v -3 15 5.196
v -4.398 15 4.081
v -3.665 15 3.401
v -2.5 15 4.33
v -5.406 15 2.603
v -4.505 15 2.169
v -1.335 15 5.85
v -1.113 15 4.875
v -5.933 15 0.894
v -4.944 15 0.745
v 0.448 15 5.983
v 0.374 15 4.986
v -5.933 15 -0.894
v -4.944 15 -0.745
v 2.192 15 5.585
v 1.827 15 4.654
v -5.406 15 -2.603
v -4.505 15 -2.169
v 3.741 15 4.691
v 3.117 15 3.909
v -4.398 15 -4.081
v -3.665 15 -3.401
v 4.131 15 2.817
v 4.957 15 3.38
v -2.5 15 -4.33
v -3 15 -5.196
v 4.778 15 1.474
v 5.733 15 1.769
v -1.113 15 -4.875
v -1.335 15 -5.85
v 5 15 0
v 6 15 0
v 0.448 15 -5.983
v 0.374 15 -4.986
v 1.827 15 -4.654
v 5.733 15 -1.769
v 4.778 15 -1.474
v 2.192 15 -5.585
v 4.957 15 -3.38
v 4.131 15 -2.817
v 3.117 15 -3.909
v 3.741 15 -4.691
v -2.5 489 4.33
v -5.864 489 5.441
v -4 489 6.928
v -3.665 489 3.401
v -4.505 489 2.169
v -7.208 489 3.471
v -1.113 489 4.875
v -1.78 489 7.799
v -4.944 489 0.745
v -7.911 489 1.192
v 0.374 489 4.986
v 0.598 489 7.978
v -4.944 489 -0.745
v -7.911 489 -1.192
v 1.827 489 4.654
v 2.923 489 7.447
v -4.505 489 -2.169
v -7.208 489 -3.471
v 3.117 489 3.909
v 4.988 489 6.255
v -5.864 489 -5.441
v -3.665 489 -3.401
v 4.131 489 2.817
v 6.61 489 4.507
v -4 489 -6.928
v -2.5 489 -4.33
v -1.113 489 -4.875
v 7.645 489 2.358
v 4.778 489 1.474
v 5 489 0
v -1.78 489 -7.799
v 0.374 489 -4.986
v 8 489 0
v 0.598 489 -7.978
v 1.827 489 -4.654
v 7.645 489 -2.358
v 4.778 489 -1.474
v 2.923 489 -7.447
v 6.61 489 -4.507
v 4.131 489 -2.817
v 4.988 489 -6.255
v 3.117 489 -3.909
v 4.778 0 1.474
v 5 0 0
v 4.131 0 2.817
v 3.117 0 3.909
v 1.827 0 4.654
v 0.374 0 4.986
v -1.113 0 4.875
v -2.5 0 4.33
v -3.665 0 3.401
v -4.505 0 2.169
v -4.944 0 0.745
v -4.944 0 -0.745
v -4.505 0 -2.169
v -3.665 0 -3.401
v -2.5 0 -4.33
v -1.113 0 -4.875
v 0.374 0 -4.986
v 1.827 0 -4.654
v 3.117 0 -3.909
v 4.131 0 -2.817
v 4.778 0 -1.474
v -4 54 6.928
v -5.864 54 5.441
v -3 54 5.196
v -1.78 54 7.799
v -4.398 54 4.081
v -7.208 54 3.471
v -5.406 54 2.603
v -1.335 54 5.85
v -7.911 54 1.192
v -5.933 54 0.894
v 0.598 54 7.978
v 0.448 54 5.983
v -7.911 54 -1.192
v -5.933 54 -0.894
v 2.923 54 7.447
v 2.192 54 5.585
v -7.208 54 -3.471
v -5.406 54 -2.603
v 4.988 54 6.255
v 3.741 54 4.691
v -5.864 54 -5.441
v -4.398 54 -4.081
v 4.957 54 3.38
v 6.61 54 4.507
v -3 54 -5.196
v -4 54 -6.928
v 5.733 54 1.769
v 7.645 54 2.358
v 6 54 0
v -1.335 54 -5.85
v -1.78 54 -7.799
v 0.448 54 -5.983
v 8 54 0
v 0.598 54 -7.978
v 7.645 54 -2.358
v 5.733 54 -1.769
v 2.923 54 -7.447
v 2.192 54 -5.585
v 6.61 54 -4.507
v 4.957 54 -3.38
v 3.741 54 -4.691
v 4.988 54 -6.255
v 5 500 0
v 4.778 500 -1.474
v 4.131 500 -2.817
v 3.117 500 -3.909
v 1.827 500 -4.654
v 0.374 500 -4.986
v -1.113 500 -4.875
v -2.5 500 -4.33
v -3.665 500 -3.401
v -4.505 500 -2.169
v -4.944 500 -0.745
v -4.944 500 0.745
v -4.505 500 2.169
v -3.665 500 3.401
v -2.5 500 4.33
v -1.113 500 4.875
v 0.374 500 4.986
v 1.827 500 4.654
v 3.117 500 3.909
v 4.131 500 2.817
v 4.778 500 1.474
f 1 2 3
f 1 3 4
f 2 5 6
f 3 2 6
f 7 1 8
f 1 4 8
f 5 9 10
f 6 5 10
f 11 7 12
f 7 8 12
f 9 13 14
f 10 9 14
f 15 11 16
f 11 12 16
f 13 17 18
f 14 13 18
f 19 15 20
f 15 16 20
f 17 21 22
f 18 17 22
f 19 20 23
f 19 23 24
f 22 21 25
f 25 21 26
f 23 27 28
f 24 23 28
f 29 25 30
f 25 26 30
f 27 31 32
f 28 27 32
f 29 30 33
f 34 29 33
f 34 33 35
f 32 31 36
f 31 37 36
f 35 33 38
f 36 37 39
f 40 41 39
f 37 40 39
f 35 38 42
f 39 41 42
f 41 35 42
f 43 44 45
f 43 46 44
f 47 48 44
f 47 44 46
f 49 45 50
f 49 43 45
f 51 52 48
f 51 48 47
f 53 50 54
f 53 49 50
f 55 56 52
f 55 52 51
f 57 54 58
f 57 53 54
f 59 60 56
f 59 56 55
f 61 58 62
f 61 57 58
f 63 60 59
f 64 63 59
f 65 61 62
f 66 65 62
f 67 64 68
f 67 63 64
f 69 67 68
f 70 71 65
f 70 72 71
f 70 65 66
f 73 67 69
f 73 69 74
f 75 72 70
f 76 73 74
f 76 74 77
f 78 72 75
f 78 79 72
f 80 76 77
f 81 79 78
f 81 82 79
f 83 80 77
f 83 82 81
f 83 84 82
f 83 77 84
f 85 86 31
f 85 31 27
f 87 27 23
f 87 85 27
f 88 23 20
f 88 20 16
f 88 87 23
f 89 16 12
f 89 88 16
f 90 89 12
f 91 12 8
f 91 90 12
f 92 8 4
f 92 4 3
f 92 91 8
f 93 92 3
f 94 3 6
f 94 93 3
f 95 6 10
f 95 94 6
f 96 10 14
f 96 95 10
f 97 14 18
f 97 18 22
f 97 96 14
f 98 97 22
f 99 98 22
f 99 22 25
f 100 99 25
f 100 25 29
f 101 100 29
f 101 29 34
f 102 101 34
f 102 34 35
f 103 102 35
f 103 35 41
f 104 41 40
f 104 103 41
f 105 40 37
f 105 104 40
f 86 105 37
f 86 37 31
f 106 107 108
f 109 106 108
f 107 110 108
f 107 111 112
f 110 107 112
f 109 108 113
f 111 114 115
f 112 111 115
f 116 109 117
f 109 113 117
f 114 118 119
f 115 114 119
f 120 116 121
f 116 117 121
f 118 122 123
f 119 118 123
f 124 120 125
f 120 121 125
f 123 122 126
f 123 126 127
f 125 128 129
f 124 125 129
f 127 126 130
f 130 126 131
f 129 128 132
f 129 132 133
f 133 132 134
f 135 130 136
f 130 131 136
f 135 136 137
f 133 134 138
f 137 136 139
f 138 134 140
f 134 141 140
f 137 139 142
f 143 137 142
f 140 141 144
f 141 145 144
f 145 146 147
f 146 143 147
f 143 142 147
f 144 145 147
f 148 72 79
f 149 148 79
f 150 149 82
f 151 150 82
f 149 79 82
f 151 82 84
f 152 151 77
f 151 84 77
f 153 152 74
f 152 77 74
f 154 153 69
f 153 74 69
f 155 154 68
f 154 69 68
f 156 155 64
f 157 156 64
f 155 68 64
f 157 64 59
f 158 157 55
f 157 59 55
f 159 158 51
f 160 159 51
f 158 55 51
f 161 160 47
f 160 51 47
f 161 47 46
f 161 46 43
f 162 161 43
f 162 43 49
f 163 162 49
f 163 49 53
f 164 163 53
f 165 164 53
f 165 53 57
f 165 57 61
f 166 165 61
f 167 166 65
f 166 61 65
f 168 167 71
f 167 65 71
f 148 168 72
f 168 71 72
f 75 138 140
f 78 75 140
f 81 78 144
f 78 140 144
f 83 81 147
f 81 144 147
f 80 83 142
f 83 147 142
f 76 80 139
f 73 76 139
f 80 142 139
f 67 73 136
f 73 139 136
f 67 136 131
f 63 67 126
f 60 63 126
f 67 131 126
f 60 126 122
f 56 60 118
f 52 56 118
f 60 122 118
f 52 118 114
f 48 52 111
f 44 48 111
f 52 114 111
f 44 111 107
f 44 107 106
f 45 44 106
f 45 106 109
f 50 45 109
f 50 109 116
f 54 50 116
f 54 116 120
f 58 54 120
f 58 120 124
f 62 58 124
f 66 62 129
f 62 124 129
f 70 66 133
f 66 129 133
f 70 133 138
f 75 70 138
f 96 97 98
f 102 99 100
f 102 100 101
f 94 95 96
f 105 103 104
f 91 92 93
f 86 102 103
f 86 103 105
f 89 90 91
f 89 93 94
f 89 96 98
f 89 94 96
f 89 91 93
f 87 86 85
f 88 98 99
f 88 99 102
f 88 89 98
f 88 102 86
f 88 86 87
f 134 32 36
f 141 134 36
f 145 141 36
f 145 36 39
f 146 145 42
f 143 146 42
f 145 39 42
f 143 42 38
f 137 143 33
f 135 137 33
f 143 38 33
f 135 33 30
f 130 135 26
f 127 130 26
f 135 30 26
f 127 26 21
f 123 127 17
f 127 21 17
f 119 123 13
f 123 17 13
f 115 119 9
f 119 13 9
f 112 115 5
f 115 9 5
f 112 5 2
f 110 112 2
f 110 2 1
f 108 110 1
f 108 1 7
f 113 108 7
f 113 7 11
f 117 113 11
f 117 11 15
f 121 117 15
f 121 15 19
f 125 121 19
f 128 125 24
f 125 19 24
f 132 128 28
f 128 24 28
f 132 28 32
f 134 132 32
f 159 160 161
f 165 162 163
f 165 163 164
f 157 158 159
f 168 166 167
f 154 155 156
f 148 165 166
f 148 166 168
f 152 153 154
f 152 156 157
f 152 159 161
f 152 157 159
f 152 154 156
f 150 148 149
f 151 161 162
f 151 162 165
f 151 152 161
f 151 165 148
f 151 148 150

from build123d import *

# Parameters (mm, degrees)
SKETCH_R     = 5
PAD_DEPTH    = 15
SKETCH001_R  = 6
PAD001_DEPTH = 39
SKETCH002_R  = 8
PAD002_DEPTH = 435
SKETCH003_R  = 5
PAD003_DEPTH = 11


with BuildPart() as part:
    # Sketch → Pad (new body)
    with BuildSketch(Plane.XZ):
        Circle(SKETCH_R)
    extrude(amount=-PAD_DEPTH)

    # Sketch001 (on Face3 of Pad) → Pad001 (join)
    with BuildSketch(Plane(origin=(0, 15, 0), x_dir=(1, 0, 0), z_dir=(0, 1, 0))):
        Circle(SKETCH001_R)
    extrude(amount=PAD001_DEPTH)

    # Sketch002 (on Face3 of Pad001) → Pad002 (join)
    with BuildSketch(Plane(origin=(0, 54, 0), x_dir=(1, 0, 0), z_dir=(0, 1, 0))):
        Circle(SKETCH002_R)
    extrude(amount=PAD002_DEPTH)

    # Sketch003 (on Face3 of Pad002) → Pad003 (join)
    with BuildSketch(Plane(origin=(0, 489, 0), x_dir=(1, 0, 0), z_dir=(0, 1, 0))):
        Circle(SKETCH003_R)
    extrude(amount=PAD003_DEPTH)


solid = part.part
